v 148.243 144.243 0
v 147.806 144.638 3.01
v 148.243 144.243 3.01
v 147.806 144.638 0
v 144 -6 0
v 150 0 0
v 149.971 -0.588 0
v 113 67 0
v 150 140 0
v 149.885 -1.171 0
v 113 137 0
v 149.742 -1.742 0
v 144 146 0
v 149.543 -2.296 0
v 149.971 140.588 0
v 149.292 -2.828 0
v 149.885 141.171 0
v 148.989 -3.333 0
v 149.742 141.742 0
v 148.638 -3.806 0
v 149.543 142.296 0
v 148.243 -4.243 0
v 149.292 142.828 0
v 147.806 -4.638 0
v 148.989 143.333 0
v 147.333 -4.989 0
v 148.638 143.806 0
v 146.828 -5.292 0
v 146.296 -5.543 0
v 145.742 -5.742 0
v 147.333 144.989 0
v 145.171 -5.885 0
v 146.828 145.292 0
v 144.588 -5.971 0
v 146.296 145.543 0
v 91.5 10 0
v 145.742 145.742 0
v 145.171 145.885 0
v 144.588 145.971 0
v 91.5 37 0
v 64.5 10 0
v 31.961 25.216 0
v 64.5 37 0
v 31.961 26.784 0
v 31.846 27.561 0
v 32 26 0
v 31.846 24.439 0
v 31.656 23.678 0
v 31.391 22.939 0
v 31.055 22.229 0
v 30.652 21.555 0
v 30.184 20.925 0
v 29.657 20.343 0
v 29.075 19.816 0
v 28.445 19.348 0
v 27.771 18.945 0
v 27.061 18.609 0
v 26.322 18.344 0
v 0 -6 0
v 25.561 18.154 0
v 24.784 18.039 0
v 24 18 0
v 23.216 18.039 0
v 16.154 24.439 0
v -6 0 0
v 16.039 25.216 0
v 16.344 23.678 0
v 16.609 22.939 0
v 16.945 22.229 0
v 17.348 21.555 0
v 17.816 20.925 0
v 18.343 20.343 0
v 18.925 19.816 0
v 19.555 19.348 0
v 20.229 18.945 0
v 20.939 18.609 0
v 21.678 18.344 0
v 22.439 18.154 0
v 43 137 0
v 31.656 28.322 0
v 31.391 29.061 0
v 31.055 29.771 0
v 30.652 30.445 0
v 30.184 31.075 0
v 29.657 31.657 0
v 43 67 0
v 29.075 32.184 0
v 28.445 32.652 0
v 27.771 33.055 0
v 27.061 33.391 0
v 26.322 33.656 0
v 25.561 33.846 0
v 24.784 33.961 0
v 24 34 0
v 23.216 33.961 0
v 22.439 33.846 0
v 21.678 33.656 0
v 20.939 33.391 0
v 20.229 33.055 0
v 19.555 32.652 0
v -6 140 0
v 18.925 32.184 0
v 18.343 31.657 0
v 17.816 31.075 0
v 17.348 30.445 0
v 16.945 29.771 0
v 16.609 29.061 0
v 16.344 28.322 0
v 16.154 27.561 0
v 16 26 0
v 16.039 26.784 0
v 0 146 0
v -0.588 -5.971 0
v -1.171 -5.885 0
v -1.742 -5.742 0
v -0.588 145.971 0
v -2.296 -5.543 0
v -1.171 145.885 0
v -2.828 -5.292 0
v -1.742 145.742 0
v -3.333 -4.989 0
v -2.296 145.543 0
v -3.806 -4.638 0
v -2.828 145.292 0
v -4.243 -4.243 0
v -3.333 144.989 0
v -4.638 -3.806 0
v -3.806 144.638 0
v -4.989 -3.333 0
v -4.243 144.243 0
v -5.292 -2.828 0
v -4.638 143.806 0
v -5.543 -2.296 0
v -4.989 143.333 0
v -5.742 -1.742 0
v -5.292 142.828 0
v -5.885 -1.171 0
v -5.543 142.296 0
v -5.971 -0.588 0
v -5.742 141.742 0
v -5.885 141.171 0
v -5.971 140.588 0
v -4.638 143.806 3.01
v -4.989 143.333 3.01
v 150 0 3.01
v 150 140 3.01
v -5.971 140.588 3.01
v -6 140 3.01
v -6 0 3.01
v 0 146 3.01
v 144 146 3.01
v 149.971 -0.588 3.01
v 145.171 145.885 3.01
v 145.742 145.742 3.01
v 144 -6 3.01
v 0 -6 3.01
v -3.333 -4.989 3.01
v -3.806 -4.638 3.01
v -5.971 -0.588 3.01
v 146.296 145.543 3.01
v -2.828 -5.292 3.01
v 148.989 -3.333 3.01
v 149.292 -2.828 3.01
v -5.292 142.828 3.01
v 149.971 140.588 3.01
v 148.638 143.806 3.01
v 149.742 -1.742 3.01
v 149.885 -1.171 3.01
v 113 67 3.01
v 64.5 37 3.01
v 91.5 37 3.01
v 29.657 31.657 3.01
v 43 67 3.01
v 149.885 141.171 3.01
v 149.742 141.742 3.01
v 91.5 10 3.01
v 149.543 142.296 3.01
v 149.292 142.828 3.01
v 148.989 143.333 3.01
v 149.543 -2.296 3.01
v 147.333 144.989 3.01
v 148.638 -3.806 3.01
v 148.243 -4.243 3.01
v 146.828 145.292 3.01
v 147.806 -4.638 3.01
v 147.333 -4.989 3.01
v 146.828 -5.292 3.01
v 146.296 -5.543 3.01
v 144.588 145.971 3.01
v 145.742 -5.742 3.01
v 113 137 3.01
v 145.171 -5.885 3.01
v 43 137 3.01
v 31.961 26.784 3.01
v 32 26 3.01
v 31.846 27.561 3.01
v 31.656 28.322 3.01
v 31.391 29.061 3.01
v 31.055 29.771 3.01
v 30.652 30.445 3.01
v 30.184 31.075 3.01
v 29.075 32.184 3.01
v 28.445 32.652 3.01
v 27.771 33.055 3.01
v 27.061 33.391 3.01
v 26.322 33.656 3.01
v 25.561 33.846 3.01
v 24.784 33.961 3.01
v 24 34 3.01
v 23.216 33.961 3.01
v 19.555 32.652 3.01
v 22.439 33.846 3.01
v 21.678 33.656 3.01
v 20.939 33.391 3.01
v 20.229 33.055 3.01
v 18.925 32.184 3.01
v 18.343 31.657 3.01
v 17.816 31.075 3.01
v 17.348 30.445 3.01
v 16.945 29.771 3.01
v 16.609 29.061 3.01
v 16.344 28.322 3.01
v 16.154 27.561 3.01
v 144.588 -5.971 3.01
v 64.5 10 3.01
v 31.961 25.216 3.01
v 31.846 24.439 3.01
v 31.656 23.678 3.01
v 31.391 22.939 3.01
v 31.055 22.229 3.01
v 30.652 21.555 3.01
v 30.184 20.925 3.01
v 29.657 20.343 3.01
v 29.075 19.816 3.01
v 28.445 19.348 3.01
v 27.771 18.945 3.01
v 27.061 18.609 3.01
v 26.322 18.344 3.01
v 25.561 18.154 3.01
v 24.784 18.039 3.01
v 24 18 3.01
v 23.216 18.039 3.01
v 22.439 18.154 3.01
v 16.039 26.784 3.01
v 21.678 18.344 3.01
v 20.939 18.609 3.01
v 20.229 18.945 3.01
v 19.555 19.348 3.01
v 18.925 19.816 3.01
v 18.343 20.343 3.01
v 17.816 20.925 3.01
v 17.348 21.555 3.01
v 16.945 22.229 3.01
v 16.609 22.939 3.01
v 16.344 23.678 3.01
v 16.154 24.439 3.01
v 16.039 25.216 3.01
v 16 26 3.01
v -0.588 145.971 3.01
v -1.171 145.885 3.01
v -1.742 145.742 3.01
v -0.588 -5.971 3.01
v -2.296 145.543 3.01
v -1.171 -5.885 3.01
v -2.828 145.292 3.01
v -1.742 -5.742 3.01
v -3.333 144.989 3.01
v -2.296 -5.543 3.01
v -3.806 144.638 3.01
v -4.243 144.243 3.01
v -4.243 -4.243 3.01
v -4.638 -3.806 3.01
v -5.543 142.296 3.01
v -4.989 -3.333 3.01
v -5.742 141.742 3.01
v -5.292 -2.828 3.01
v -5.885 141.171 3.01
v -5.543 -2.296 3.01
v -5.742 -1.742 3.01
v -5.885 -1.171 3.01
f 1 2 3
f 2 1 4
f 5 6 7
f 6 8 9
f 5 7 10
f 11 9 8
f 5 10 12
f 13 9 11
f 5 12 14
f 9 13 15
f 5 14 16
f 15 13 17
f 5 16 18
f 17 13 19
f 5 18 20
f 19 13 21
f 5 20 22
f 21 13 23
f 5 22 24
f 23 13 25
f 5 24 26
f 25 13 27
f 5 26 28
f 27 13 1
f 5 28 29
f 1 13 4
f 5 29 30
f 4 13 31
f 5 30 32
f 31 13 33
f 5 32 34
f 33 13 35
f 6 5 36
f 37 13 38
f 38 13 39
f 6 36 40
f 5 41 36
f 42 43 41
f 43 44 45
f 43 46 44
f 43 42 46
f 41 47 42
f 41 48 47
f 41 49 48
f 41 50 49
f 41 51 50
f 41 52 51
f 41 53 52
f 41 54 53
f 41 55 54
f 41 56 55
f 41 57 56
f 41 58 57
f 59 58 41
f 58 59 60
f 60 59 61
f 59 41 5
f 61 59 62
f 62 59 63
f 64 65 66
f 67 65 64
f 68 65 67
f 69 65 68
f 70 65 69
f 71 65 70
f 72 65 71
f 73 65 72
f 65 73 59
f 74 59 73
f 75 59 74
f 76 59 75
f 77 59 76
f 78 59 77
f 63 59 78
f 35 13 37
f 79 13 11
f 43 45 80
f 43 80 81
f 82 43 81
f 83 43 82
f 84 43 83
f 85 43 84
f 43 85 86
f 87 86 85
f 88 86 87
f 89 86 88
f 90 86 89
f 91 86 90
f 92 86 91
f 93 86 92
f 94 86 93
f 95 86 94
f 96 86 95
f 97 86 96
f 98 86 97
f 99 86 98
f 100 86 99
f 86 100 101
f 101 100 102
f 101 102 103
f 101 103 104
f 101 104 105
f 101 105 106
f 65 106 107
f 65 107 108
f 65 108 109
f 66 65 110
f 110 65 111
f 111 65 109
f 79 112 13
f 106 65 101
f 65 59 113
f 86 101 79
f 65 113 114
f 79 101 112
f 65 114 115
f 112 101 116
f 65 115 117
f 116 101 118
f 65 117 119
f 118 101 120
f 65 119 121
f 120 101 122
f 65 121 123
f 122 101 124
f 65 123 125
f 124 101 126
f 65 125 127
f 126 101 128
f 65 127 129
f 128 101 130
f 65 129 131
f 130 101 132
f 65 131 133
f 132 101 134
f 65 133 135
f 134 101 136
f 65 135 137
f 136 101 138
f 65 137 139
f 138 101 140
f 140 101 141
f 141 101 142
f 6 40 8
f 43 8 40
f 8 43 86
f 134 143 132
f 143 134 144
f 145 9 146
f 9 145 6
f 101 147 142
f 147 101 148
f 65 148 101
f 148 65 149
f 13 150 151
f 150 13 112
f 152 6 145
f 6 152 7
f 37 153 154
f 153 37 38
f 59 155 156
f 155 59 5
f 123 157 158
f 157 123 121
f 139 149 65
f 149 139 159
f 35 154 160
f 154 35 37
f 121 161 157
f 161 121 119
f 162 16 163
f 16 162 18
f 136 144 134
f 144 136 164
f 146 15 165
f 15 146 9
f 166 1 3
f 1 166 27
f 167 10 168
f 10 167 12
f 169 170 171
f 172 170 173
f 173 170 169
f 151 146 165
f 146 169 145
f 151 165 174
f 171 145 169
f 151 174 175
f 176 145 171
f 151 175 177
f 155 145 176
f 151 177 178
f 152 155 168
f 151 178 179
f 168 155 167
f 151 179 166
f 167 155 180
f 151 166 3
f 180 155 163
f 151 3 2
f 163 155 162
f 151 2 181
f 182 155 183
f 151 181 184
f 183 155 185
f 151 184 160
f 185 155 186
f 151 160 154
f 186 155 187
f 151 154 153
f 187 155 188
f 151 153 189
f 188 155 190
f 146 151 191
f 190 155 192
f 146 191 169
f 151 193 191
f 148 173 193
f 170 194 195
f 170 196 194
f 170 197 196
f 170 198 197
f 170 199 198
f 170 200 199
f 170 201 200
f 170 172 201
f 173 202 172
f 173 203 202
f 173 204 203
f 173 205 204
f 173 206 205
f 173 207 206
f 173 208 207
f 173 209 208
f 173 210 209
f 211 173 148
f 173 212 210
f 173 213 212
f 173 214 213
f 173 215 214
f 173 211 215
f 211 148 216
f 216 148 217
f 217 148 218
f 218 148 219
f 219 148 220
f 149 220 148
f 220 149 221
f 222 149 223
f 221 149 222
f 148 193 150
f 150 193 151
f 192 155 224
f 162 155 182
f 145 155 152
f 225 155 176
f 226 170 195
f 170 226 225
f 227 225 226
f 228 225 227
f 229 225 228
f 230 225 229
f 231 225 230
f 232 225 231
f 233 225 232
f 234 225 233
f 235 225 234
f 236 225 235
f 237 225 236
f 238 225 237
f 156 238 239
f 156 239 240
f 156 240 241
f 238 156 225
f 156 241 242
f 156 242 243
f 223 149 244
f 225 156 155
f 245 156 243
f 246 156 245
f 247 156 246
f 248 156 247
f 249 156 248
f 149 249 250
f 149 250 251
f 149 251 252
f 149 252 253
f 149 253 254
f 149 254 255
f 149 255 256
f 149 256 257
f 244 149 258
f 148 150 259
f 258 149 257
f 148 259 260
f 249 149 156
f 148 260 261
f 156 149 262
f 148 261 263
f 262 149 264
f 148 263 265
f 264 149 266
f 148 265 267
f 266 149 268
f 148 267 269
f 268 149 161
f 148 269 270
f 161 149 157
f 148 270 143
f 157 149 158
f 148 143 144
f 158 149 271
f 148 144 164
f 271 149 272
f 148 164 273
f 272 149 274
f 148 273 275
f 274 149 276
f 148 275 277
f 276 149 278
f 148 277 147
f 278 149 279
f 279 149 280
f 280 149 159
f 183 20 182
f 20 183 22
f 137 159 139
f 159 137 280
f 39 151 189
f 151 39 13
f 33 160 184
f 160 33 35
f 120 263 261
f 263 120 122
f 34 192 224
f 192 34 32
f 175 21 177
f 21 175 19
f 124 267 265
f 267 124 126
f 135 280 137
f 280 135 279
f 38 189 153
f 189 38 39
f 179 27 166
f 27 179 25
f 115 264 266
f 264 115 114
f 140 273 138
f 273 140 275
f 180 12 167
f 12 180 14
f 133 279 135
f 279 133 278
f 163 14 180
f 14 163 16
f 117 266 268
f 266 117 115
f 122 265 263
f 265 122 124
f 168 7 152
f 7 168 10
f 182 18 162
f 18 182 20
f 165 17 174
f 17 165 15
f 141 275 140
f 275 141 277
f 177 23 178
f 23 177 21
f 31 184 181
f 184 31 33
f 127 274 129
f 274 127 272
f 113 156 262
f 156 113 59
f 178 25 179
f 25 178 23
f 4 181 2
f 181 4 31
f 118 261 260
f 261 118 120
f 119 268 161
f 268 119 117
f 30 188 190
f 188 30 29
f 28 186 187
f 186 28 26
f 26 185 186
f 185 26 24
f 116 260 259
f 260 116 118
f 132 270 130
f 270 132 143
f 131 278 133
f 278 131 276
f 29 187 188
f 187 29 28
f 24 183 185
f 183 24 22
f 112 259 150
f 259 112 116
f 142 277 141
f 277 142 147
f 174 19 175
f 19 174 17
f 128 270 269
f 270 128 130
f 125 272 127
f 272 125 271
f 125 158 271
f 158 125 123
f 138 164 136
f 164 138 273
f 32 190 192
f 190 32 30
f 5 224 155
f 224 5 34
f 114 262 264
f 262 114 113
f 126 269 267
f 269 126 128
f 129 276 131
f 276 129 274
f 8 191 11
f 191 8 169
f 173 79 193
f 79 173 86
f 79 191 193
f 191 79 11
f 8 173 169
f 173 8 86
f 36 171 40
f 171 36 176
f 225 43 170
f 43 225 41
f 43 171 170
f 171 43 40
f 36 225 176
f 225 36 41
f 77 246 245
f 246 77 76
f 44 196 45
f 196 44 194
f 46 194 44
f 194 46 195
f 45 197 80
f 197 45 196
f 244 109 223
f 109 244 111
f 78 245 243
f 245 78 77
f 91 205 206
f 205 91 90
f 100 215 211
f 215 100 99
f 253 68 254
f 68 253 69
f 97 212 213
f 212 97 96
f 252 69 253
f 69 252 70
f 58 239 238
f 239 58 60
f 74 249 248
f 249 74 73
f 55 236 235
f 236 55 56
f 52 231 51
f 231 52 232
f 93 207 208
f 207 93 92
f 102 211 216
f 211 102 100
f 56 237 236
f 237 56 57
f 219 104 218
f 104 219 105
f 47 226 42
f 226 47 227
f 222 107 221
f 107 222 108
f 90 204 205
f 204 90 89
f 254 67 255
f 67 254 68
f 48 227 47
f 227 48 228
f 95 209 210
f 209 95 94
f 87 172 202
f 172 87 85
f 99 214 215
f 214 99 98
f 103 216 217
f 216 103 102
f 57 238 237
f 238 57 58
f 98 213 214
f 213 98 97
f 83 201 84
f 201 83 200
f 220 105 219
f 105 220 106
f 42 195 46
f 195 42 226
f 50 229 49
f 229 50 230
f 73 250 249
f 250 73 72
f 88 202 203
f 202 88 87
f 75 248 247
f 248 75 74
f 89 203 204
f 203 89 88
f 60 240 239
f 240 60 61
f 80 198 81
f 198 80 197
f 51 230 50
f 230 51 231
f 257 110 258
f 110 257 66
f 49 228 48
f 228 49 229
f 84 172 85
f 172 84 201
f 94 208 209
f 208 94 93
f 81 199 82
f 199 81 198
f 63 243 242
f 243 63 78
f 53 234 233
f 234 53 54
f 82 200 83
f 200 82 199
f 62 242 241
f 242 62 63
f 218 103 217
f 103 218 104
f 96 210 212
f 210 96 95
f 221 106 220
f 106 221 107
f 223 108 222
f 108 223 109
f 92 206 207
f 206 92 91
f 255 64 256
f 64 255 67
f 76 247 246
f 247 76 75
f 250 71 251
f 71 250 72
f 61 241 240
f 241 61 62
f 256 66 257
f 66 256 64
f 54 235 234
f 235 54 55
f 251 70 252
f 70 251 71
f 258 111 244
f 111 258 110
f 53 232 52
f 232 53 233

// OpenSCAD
// file: ../../../00_parametros.scad
//
// ============================================================================
// SteamMachine UM790
// Project Phoenix
//
// Archivo : 00_parametros.scad
// Versión : 3.0
//
// ÚNICA fuente de parámetros del proyecto.
//
// ============================================================================

$fn = 64;

//=============================================================================
// INFORMACIÓN
//=============================================================================

project_name    = "SteamMachine UM790";
project_version = "3.0";

//=============================================================================
// CARCASA EXTERIOR (Steam Machine original)
//=============================================================================

case_width  = 156.0;
case_depth  = 162.4;
case_height = 152.0;

wall_thickness = 3.0;

bottom_thickness = 3.0;
top_thickness    = 3.0;

//=============================================================================
// CÁMARA INFERIOR
//=============================================================================

lower_air_chamber = 12.0;

//=============================================================================
// BANDEJA
//=============================================================================

tray_width     = 150.0;
tray_depth     = 150.0;
tray_thickness = 3.0;

base_frame_width   = 10.0;
base_outer_chamfer = 4.0;
base_inner_chamfer = 4.0;

//=============================================================================
// PCB UM790
//=============================================================================

pcb_width     = 122.0;
pcb_depth     = 119.5;
pcb_thickness = 1.60;

um790_mount_spacing_x = 113.0;
um790_mount_spacing_y = 99.0;

//=============================================================================
// POSTES
//=============================================================================

um790_post_height   = 6.0;
um790_post_diameter = 7.0;

insert_diameter = 4.10;
insert_depth    = 5.00;

//=============================================================================
// DERIVADOS
//=============================================================================

off_x = um790_mount_spacing_x/2;
off_y = um790_mount_spacing_y/2;

//=============================================================================
// NERVIOS
//=============================================================================

rib_width  = 3.0;
rib_height = 5.0;

//=============================================================================
// VENTILACIÓN
//=============================================================================

bottom_grill_margin = 12.0;

vent_slot_width  = 4.0;
vent_slot_length = 40.0;
vent_spacing     = 8.0;

//=============================================================================
// VENTILADOR SUPERIOR
//=============================================================================

fan_size       = 120.0;
fan_thickness  = 15.0;
fan_hole_pitch = 105.0;

//=============================================================================
// PANEL FRONTAL
//=============================================================================

front_panel_thickness = 3.0;

power_button_diameter = 8.0;

//=============================================================================
// BARRA LED
//=============================================================================

led_bar_width  = 110.0;
led_bar_height = 8.0;
led_bar_depth  = 3.0;

//=============================================================================
// PANEL NFC
//=============================================================================

nfc_panel_width  = 70.0;
nfc_panel_height = 70.0;
nfc_panel_depth  = 3.0;

//=============================================================================
// LECTOR NFC
//=============================================================================

nfc_reader_width  = 60.0;
nfc_reader_height = 40.0;
nfc_reader_depth  = 10.0;

//=============================================================================
// HUB USB (CJMCU-204)
//=============================================================================

usb_hub_width  = 44.1;
usb_hub_depth  = 44.1;
usb_hub_height = 12.0;

usb_hub_mount_hole = 3.0;

// Mediremos estas distancias directamente del STL
usb_port_pitch_x = 0;
usb_port_pitch_y = 0;

//=============================================================================
// ESP32
//=============================================================================

esp32_width  = 51.0;
esp32_depth  = 28.0;
esp32_height = 13.0;

//=============================================================================
// PLACA ADAPTADORA ESP32
//=============================================================================

esp32_board_width  = 76.0;
esp32_board_depth  = 76.0;
esp32_board_height = 15.0;

//=============================================================================
// IMANES
//=============================================================================

magnet_diameter = 8.0;
magnet_height   = 3.0;

//=============================================================================
// TORNILLERÍA
//=============================================================================

mount_hole = 3.4;

//=============================================================================
// COMPATIBILIDAD CON VERSIONES ANTERIORES
//=============================================================================

pcb_x = pcb_width;
pcb_y = pcb_depth;

hole_dist_x = um790_mount_spacing_x;
hole_dist_y = um790_mount_spacing_y;

standoff_height = um790_post_height;
standoff_dia    = um790_post_diameter;

insert_dia = insert_diameter;

base_thickness = tray_thickness;

//=============================================================================
// FILOSOFÍA DEL PROYECTO
//=============================================================================
//
// - Chasis principal fijo.
// - Panel trasero desmontable.
// - Panel superior desmontable.
// - Panel NFC intercambiable.
// - Módulo USB + pulsador independiente y sustituible.
// - Soporte ESP32 desmontable.
// - Toda pieza deberá obtener sus dimensiones EXCLUSIVAMENTE
//   desde este archivo.
//
// main file
//
// ============================================================================
// SteamMachine UM790
// Project Phoenix
//
// front_panel.scad
// PARTE 1
//
// ============================================================================

include <../../../00_parametros.scad>;

$fn = 64;

//------------------------------------------------------------
// Parámetros
//------------------------------------------------------------

panel_w = case_width;
panel_h = case_height;
panel_t = front_panel_thickness;

corner_r = 6;

//------------------------------------------------------------
// Posiciones
//------------------------------------------------------------

// Panel NFC

nfc_w = nfc_panel_width;
nfc_h = nfc_panel_height;

nfc_x = (panel_w-nfc_w)/2;
nfc_y = panel_h-15-nfc_h;


// Barra LED

led_margin = 8;

led_w = panel_w-led_margin*2;
led_h = led_bar_height;

led_x = led_margin;
led_y = nfc_y-14;


// Pulsador

button_d = 16;

button_x = 24;
button_y = 26;


// OLED

oled_size = 27;

oled_x = (panel_w-oled_size)/2;
oled_y = 10;


//------------------------------------------------------------
// Panel principal
//------------------------------------------------------------

module front_panel()
{

    difference()
    {

        // Panel exterior

        minkowski()
        {

            cube(
            [
                panel_w-corner_r*2,
                panel_h-corner_r*2,
                panel_t
            ]);

            cylinder(
                r=corner_r,
                h=0.01
            );

        }

        //----------------------------------------------------
        // Hueco NFC
        //----------------------------------------------------

        translate(
        [
            nfc_x,
            nfc_y,
            -1
        ])

        cube(
        [
            nfc_w,
            nfc_h,
            panel_t+2
        ]);


        //----------------------------------------------------
        // Hueco OLED
        //----------------------------------------------------

        translate(
        [
            oled_x,
            oled_y,
            -1
        ])

        cube(
        [
            oled_size,
            oled_size,
            panel_t+2
        ]);


        //----------------------------------------------------
        // Hueco pulsador
        //----------------------------------------------------

        translate(
        [
            button_x,
            button_y,
            -1
        ])

        cylinder(
            d=button_d,
            h=panel_t+2
        );

    }

}


//------------------------------------------------------------
// Barra LED (pieza de doble color)
//------------------------------------------------------------

module led_diffuser()
{

    translate(
    [
        led_x,
        led_y,
        0
    ])

    cube(
    [
        led_w,
        led_h,
        panel_t
    ]);

}


//------------------------------------------------------------
// Vista previa
//------------------------------------------------------------

color("Black")
front_panel();

color([1,1,1,0.8])
led_diffuser();
